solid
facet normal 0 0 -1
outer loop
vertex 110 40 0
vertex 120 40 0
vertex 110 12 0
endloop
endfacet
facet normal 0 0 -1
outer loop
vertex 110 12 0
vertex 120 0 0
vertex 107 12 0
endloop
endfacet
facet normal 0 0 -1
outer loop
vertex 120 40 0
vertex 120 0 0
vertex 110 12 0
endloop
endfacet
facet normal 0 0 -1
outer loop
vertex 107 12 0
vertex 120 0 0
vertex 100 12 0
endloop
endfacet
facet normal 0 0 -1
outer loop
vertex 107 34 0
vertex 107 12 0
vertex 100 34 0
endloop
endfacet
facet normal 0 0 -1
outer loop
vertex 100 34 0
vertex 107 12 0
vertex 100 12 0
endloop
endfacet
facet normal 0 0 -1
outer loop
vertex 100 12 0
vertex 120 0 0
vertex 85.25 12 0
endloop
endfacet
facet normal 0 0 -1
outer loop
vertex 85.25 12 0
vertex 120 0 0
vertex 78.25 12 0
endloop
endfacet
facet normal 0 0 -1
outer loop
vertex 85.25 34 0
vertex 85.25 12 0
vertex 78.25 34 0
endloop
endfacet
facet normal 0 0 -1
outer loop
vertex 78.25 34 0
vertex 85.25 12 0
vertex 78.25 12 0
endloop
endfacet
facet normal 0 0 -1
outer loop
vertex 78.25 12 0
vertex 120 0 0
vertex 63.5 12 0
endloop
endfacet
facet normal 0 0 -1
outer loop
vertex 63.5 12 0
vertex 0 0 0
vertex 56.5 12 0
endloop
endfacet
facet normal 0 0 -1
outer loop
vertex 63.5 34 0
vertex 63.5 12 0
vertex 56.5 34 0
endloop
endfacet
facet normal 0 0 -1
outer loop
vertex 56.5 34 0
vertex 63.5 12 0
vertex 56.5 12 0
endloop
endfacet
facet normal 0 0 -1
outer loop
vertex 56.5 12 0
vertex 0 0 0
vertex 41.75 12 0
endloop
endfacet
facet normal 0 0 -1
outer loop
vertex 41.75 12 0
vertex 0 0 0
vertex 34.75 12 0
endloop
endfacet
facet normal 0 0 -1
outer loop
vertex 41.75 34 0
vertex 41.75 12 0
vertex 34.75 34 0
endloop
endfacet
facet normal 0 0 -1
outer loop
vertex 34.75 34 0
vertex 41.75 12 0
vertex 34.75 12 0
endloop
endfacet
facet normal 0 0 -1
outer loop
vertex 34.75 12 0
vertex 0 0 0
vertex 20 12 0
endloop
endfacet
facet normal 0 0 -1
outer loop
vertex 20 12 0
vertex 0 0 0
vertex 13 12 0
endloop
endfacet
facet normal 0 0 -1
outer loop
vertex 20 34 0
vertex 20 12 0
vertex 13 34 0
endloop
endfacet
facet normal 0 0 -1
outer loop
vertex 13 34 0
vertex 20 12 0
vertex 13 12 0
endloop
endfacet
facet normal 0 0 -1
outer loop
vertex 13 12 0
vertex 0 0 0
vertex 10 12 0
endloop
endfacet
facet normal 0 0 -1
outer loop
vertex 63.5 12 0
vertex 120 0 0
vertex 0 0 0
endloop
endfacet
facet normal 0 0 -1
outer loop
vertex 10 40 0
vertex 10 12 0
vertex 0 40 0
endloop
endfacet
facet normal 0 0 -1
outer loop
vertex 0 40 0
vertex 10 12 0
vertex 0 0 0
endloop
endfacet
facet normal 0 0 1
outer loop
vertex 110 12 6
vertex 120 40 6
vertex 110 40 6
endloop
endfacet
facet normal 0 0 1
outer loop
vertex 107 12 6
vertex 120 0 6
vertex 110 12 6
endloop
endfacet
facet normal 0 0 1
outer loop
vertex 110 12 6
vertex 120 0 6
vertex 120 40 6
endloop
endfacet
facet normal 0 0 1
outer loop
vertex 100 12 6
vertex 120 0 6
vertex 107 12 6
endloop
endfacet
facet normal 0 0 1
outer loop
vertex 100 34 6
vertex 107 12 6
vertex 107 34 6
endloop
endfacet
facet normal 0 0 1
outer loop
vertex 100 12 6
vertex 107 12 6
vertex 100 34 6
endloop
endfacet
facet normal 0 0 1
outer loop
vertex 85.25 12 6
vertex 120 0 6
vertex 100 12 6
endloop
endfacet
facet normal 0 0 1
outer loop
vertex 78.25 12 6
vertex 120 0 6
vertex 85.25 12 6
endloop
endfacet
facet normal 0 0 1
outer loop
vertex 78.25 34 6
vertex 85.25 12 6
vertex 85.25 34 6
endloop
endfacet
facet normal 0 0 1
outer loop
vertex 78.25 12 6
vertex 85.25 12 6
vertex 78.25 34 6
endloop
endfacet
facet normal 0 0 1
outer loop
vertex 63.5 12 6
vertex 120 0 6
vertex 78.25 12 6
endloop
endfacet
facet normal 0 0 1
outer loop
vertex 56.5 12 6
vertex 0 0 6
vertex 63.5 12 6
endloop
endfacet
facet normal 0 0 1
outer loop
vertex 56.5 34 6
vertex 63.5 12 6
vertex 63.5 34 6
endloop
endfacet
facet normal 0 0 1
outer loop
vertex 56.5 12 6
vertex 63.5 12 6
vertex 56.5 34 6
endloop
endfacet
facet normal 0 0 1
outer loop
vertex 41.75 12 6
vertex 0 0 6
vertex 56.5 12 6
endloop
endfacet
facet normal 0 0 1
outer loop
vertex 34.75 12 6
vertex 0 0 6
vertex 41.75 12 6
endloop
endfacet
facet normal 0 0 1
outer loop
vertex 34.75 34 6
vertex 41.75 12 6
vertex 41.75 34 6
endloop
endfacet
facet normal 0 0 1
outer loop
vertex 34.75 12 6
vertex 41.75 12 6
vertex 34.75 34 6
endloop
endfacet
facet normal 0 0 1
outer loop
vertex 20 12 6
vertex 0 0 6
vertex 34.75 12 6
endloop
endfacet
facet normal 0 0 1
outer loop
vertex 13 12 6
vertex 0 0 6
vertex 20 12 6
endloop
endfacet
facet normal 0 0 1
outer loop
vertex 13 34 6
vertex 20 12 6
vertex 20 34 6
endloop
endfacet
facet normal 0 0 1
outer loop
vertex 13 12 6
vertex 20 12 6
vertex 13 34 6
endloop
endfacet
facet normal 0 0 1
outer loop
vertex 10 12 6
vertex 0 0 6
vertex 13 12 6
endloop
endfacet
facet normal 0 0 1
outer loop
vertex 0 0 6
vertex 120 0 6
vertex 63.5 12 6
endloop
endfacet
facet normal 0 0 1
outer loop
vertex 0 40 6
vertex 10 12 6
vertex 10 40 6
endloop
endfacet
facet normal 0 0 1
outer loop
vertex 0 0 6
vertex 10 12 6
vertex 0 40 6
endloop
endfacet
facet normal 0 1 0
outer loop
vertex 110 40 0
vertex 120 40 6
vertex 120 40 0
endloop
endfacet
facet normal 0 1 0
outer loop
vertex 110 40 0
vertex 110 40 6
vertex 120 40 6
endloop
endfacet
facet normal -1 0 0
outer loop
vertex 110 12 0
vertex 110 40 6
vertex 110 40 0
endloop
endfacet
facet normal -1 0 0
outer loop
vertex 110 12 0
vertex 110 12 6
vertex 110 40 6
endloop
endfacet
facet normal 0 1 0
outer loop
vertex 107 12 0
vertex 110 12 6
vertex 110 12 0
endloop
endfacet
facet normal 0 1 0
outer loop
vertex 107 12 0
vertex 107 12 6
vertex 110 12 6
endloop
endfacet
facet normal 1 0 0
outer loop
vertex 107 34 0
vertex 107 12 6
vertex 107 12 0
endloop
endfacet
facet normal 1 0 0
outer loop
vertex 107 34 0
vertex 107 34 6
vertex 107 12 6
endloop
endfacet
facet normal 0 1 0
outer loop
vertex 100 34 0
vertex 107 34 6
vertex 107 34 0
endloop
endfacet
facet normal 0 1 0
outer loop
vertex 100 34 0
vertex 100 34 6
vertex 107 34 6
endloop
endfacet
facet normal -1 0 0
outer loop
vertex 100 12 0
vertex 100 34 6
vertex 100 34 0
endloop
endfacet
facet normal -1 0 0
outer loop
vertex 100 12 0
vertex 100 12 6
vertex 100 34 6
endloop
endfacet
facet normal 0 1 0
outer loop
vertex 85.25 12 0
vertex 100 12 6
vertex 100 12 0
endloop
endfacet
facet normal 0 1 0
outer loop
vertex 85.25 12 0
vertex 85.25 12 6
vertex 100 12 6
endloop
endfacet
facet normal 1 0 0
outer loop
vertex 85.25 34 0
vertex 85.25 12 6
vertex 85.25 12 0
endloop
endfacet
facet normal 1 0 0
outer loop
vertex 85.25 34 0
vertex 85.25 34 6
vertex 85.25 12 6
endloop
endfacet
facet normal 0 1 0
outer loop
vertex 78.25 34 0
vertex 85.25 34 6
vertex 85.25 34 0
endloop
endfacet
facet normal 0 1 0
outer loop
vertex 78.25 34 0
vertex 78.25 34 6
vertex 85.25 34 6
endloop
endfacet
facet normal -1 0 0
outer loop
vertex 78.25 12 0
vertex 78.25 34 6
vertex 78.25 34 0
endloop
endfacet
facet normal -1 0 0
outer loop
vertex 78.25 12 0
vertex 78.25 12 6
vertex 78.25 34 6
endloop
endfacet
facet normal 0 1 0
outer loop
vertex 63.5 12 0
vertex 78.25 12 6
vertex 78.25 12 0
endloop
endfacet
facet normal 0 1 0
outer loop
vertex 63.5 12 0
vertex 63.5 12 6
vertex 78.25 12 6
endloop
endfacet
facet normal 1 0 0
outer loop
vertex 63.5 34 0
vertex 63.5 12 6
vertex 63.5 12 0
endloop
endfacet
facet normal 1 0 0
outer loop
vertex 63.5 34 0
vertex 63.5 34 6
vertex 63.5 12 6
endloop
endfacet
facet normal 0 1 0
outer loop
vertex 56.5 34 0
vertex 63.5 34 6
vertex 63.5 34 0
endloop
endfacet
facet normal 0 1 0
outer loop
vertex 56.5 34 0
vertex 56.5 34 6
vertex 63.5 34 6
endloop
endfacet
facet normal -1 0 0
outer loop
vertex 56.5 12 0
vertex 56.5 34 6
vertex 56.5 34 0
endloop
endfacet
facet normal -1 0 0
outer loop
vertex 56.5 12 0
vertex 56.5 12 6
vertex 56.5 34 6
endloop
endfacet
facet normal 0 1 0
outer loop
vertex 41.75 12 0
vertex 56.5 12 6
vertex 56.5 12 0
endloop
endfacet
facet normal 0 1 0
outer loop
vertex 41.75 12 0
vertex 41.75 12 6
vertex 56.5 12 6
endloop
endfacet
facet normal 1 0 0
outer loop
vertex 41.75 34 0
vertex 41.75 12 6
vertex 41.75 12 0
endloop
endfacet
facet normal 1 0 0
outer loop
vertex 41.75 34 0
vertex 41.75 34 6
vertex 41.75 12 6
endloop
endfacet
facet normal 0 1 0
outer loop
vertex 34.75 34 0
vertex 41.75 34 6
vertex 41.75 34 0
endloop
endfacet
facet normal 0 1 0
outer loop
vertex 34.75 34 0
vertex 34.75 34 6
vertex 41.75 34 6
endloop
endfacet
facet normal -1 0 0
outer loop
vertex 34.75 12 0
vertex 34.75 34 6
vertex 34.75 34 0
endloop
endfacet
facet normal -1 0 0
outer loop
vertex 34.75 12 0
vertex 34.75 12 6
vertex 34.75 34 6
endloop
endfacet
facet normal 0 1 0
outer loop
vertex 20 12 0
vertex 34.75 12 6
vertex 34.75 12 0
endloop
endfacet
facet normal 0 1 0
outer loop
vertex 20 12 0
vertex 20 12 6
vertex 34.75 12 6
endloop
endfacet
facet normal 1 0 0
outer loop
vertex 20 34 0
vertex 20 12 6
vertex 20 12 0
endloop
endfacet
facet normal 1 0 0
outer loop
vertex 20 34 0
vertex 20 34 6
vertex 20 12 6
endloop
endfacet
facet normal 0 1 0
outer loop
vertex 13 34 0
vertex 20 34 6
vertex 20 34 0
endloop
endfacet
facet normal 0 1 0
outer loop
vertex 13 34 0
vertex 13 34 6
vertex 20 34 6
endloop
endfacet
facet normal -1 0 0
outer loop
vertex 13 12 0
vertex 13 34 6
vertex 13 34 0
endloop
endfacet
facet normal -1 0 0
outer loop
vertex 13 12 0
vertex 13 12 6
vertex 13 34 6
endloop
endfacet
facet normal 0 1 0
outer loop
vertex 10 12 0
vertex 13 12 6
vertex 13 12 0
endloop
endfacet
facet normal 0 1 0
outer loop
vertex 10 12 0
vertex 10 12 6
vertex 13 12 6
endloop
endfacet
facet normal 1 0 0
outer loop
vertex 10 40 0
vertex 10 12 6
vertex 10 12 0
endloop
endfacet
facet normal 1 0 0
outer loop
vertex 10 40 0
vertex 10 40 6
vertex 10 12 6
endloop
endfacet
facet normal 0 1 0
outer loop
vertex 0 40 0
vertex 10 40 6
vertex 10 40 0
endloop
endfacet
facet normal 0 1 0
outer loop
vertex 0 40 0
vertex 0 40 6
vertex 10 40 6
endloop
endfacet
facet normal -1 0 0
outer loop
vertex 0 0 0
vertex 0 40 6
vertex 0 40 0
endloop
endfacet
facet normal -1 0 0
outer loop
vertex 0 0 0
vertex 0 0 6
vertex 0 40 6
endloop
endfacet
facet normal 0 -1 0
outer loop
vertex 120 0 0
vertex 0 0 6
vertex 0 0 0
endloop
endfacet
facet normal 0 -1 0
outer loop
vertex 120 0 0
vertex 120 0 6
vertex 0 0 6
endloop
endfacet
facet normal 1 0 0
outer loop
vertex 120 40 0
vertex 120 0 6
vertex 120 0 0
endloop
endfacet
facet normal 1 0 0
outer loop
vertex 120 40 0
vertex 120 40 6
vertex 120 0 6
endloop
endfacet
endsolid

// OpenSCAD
$fn = 32;

// ----------------------------------------------------------------------
// Guard grille: 5 slats over a 120 x 40 mm plate
// ----------------------------------------------------------------------

// --- parameters (mm) ---
profile_height = 6;       // extrusion height
profile_points = 28;      // points of the closed outline

profile = [[0, 0], [120, 0], [120, 40], [110, 40], [110, 12], [107, 12], [107, 34], [100, 34], [100, 12], [85.25, 12], [85.25, 34], [78.25, 34], [78.25, 12], [63.5, 12], [63.5, 34], [56.5, 34], [56.5, 12], [41.75, 12], [41.75, 34], [34.75, 34], [34.75, 12], [20, 12], [20, 34], [13, 34], [13, 12], [10, 12], [10, 40], [0, 40]];  // single closed polygon, 28 points, counter clockwise

// --- the one profile operation ---
linear_extrude(height = profile_height) polygon(points = profile);
